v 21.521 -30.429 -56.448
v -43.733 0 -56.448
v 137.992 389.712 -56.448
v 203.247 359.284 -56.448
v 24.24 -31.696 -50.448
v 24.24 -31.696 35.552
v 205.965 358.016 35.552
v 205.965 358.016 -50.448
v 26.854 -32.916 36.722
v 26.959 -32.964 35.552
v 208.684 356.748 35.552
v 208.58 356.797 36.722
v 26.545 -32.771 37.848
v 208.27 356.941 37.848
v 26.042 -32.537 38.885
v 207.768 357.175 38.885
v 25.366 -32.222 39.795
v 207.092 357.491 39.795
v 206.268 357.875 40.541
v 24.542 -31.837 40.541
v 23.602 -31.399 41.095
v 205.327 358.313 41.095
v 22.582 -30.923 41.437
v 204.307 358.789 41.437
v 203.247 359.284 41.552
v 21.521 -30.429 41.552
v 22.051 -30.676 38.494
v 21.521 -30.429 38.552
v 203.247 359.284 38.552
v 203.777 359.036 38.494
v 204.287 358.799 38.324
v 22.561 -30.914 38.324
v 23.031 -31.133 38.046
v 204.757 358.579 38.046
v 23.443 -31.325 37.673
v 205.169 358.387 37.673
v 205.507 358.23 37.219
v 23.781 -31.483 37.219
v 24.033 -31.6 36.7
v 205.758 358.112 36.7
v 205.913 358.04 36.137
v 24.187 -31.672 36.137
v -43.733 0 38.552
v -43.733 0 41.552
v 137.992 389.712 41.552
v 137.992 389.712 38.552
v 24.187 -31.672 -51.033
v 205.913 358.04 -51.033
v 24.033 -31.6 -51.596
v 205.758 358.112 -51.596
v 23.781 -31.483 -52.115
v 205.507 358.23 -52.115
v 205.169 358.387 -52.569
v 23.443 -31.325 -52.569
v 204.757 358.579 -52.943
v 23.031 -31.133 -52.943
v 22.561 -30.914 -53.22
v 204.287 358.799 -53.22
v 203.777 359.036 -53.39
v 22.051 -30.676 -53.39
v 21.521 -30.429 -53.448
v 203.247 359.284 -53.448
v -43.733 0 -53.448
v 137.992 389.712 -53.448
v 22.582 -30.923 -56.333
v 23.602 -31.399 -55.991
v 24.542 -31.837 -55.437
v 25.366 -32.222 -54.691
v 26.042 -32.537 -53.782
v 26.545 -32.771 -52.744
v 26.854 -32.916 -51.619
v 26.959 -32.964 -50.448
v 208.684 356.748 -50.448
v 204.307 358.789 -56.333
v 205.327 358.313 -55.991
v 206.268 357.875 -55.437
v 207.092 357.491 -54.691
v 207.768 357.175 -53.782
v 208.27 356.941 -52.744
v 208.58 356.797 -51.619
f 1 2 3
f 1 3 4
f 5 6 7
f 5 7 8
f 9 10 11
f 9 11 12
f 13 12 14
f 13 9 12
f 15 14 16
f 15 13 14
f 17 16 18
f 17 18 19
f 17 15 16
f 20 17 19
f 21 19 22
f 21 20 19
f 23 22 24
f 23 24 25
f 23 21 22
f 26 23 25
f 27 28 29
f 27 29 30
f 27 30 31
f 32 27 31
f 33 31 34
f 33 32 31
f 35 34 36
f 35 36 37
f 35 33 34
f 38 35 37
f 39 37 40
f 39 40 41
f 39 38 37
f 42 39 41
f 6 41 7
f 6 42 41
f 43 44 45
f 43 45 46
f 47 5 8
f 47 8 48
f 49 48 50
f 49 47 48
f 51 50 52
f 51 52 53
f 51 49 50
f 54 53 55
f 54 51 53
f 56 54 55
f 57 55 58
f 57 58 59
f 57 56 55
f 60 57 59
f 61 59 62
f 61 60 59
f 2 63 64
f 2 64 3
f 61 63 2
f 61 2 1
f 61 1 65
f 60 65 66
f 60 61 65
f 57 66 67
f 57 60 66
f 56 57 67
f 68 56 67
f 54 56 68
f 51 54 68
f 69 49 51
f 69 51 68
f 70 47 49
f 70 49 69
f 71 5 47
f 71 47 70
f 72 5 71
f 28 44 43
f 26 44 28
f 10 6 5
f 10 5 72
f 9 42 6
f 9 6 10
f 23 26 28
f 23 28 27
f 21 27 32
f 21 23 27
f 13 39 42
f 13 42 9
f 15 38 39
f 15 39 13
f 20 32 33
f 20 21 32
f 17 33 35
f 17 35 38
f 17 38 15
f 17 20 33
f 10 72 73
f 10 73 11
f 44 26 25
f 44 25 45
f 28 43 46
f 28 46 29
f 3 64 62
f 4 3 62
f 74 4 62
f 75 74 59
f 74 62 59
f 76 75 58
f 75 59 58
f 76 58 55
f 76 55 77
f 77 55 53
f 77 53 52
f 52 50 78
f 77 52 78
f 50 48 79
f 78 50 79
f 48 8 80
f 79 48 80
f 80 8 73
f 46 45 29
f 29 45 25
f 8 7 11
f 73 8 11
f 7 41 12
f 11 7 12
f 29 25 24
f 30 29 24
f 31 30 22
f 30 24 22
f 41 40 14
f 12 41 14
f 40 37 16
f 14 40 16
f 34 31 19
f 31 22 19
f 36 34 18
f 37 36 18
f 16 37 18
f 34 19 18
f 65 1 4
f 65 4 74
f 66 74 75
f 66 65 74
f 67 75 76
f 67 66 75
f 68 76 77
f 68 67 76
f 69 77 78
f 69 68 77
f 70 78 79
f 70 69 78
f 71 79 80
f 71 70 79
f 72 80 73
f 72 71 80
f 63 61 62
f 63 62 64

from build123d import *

# Parameters (mm, degrees)
F1_DEPTH = 430
F2_ANGLE = 25


with BuildPart() as f1:
    # F0 (on Front) → F1 (new body)
    with BuildSketch(Plane.XZ):
        with BuildLine():
            Line((-43.73349, 41.551889), (-43.73349, 38.551889))
            Line((-43.73349, 38.551889), (28.26651, 38.551889))
            ThreePointArc((28.26651, 38.551889), (30.38783, 37.673209), (31.26651, 35.551889))
            Line((31.26651, 35.551889), (31.26651, -50.448111))
            ThreePointArc((31.26651, -50.448111), (30.38783, -52.569431), (28.26651, -53.448111))
            Line((28.26651, -53.448111), (-43.73349, -53.448111))
            Line((-43.73349, -53.448111), (-43.73349, -56.448111))
            Line((-43.73349, -56.448111), (28.26651, -56.448111))
            ThreePointArc((28.26651, -56.448111), (32.509151, -54.690752), (34.26651, -50.448111))
            Line((34.26651, -50.448111), (34.26651, 35.551889))
            ThreePointArc((34.26651, 35.551889), (32.509151, 39.79453), (28.26651, 41.551889))
            Line((28.26651, 41.551889), (-43.73349, 41.551889))
        make_face()
    extrude(amount=-F1_DEPTH)


with BuildPart() as f1_1:
    # F2: moved
    add(f1.part.rotate(Axis((-43.73349, 0, 40.051889), (0, 0, -1)), F2_ANGLE))


solid = f1_1.part
